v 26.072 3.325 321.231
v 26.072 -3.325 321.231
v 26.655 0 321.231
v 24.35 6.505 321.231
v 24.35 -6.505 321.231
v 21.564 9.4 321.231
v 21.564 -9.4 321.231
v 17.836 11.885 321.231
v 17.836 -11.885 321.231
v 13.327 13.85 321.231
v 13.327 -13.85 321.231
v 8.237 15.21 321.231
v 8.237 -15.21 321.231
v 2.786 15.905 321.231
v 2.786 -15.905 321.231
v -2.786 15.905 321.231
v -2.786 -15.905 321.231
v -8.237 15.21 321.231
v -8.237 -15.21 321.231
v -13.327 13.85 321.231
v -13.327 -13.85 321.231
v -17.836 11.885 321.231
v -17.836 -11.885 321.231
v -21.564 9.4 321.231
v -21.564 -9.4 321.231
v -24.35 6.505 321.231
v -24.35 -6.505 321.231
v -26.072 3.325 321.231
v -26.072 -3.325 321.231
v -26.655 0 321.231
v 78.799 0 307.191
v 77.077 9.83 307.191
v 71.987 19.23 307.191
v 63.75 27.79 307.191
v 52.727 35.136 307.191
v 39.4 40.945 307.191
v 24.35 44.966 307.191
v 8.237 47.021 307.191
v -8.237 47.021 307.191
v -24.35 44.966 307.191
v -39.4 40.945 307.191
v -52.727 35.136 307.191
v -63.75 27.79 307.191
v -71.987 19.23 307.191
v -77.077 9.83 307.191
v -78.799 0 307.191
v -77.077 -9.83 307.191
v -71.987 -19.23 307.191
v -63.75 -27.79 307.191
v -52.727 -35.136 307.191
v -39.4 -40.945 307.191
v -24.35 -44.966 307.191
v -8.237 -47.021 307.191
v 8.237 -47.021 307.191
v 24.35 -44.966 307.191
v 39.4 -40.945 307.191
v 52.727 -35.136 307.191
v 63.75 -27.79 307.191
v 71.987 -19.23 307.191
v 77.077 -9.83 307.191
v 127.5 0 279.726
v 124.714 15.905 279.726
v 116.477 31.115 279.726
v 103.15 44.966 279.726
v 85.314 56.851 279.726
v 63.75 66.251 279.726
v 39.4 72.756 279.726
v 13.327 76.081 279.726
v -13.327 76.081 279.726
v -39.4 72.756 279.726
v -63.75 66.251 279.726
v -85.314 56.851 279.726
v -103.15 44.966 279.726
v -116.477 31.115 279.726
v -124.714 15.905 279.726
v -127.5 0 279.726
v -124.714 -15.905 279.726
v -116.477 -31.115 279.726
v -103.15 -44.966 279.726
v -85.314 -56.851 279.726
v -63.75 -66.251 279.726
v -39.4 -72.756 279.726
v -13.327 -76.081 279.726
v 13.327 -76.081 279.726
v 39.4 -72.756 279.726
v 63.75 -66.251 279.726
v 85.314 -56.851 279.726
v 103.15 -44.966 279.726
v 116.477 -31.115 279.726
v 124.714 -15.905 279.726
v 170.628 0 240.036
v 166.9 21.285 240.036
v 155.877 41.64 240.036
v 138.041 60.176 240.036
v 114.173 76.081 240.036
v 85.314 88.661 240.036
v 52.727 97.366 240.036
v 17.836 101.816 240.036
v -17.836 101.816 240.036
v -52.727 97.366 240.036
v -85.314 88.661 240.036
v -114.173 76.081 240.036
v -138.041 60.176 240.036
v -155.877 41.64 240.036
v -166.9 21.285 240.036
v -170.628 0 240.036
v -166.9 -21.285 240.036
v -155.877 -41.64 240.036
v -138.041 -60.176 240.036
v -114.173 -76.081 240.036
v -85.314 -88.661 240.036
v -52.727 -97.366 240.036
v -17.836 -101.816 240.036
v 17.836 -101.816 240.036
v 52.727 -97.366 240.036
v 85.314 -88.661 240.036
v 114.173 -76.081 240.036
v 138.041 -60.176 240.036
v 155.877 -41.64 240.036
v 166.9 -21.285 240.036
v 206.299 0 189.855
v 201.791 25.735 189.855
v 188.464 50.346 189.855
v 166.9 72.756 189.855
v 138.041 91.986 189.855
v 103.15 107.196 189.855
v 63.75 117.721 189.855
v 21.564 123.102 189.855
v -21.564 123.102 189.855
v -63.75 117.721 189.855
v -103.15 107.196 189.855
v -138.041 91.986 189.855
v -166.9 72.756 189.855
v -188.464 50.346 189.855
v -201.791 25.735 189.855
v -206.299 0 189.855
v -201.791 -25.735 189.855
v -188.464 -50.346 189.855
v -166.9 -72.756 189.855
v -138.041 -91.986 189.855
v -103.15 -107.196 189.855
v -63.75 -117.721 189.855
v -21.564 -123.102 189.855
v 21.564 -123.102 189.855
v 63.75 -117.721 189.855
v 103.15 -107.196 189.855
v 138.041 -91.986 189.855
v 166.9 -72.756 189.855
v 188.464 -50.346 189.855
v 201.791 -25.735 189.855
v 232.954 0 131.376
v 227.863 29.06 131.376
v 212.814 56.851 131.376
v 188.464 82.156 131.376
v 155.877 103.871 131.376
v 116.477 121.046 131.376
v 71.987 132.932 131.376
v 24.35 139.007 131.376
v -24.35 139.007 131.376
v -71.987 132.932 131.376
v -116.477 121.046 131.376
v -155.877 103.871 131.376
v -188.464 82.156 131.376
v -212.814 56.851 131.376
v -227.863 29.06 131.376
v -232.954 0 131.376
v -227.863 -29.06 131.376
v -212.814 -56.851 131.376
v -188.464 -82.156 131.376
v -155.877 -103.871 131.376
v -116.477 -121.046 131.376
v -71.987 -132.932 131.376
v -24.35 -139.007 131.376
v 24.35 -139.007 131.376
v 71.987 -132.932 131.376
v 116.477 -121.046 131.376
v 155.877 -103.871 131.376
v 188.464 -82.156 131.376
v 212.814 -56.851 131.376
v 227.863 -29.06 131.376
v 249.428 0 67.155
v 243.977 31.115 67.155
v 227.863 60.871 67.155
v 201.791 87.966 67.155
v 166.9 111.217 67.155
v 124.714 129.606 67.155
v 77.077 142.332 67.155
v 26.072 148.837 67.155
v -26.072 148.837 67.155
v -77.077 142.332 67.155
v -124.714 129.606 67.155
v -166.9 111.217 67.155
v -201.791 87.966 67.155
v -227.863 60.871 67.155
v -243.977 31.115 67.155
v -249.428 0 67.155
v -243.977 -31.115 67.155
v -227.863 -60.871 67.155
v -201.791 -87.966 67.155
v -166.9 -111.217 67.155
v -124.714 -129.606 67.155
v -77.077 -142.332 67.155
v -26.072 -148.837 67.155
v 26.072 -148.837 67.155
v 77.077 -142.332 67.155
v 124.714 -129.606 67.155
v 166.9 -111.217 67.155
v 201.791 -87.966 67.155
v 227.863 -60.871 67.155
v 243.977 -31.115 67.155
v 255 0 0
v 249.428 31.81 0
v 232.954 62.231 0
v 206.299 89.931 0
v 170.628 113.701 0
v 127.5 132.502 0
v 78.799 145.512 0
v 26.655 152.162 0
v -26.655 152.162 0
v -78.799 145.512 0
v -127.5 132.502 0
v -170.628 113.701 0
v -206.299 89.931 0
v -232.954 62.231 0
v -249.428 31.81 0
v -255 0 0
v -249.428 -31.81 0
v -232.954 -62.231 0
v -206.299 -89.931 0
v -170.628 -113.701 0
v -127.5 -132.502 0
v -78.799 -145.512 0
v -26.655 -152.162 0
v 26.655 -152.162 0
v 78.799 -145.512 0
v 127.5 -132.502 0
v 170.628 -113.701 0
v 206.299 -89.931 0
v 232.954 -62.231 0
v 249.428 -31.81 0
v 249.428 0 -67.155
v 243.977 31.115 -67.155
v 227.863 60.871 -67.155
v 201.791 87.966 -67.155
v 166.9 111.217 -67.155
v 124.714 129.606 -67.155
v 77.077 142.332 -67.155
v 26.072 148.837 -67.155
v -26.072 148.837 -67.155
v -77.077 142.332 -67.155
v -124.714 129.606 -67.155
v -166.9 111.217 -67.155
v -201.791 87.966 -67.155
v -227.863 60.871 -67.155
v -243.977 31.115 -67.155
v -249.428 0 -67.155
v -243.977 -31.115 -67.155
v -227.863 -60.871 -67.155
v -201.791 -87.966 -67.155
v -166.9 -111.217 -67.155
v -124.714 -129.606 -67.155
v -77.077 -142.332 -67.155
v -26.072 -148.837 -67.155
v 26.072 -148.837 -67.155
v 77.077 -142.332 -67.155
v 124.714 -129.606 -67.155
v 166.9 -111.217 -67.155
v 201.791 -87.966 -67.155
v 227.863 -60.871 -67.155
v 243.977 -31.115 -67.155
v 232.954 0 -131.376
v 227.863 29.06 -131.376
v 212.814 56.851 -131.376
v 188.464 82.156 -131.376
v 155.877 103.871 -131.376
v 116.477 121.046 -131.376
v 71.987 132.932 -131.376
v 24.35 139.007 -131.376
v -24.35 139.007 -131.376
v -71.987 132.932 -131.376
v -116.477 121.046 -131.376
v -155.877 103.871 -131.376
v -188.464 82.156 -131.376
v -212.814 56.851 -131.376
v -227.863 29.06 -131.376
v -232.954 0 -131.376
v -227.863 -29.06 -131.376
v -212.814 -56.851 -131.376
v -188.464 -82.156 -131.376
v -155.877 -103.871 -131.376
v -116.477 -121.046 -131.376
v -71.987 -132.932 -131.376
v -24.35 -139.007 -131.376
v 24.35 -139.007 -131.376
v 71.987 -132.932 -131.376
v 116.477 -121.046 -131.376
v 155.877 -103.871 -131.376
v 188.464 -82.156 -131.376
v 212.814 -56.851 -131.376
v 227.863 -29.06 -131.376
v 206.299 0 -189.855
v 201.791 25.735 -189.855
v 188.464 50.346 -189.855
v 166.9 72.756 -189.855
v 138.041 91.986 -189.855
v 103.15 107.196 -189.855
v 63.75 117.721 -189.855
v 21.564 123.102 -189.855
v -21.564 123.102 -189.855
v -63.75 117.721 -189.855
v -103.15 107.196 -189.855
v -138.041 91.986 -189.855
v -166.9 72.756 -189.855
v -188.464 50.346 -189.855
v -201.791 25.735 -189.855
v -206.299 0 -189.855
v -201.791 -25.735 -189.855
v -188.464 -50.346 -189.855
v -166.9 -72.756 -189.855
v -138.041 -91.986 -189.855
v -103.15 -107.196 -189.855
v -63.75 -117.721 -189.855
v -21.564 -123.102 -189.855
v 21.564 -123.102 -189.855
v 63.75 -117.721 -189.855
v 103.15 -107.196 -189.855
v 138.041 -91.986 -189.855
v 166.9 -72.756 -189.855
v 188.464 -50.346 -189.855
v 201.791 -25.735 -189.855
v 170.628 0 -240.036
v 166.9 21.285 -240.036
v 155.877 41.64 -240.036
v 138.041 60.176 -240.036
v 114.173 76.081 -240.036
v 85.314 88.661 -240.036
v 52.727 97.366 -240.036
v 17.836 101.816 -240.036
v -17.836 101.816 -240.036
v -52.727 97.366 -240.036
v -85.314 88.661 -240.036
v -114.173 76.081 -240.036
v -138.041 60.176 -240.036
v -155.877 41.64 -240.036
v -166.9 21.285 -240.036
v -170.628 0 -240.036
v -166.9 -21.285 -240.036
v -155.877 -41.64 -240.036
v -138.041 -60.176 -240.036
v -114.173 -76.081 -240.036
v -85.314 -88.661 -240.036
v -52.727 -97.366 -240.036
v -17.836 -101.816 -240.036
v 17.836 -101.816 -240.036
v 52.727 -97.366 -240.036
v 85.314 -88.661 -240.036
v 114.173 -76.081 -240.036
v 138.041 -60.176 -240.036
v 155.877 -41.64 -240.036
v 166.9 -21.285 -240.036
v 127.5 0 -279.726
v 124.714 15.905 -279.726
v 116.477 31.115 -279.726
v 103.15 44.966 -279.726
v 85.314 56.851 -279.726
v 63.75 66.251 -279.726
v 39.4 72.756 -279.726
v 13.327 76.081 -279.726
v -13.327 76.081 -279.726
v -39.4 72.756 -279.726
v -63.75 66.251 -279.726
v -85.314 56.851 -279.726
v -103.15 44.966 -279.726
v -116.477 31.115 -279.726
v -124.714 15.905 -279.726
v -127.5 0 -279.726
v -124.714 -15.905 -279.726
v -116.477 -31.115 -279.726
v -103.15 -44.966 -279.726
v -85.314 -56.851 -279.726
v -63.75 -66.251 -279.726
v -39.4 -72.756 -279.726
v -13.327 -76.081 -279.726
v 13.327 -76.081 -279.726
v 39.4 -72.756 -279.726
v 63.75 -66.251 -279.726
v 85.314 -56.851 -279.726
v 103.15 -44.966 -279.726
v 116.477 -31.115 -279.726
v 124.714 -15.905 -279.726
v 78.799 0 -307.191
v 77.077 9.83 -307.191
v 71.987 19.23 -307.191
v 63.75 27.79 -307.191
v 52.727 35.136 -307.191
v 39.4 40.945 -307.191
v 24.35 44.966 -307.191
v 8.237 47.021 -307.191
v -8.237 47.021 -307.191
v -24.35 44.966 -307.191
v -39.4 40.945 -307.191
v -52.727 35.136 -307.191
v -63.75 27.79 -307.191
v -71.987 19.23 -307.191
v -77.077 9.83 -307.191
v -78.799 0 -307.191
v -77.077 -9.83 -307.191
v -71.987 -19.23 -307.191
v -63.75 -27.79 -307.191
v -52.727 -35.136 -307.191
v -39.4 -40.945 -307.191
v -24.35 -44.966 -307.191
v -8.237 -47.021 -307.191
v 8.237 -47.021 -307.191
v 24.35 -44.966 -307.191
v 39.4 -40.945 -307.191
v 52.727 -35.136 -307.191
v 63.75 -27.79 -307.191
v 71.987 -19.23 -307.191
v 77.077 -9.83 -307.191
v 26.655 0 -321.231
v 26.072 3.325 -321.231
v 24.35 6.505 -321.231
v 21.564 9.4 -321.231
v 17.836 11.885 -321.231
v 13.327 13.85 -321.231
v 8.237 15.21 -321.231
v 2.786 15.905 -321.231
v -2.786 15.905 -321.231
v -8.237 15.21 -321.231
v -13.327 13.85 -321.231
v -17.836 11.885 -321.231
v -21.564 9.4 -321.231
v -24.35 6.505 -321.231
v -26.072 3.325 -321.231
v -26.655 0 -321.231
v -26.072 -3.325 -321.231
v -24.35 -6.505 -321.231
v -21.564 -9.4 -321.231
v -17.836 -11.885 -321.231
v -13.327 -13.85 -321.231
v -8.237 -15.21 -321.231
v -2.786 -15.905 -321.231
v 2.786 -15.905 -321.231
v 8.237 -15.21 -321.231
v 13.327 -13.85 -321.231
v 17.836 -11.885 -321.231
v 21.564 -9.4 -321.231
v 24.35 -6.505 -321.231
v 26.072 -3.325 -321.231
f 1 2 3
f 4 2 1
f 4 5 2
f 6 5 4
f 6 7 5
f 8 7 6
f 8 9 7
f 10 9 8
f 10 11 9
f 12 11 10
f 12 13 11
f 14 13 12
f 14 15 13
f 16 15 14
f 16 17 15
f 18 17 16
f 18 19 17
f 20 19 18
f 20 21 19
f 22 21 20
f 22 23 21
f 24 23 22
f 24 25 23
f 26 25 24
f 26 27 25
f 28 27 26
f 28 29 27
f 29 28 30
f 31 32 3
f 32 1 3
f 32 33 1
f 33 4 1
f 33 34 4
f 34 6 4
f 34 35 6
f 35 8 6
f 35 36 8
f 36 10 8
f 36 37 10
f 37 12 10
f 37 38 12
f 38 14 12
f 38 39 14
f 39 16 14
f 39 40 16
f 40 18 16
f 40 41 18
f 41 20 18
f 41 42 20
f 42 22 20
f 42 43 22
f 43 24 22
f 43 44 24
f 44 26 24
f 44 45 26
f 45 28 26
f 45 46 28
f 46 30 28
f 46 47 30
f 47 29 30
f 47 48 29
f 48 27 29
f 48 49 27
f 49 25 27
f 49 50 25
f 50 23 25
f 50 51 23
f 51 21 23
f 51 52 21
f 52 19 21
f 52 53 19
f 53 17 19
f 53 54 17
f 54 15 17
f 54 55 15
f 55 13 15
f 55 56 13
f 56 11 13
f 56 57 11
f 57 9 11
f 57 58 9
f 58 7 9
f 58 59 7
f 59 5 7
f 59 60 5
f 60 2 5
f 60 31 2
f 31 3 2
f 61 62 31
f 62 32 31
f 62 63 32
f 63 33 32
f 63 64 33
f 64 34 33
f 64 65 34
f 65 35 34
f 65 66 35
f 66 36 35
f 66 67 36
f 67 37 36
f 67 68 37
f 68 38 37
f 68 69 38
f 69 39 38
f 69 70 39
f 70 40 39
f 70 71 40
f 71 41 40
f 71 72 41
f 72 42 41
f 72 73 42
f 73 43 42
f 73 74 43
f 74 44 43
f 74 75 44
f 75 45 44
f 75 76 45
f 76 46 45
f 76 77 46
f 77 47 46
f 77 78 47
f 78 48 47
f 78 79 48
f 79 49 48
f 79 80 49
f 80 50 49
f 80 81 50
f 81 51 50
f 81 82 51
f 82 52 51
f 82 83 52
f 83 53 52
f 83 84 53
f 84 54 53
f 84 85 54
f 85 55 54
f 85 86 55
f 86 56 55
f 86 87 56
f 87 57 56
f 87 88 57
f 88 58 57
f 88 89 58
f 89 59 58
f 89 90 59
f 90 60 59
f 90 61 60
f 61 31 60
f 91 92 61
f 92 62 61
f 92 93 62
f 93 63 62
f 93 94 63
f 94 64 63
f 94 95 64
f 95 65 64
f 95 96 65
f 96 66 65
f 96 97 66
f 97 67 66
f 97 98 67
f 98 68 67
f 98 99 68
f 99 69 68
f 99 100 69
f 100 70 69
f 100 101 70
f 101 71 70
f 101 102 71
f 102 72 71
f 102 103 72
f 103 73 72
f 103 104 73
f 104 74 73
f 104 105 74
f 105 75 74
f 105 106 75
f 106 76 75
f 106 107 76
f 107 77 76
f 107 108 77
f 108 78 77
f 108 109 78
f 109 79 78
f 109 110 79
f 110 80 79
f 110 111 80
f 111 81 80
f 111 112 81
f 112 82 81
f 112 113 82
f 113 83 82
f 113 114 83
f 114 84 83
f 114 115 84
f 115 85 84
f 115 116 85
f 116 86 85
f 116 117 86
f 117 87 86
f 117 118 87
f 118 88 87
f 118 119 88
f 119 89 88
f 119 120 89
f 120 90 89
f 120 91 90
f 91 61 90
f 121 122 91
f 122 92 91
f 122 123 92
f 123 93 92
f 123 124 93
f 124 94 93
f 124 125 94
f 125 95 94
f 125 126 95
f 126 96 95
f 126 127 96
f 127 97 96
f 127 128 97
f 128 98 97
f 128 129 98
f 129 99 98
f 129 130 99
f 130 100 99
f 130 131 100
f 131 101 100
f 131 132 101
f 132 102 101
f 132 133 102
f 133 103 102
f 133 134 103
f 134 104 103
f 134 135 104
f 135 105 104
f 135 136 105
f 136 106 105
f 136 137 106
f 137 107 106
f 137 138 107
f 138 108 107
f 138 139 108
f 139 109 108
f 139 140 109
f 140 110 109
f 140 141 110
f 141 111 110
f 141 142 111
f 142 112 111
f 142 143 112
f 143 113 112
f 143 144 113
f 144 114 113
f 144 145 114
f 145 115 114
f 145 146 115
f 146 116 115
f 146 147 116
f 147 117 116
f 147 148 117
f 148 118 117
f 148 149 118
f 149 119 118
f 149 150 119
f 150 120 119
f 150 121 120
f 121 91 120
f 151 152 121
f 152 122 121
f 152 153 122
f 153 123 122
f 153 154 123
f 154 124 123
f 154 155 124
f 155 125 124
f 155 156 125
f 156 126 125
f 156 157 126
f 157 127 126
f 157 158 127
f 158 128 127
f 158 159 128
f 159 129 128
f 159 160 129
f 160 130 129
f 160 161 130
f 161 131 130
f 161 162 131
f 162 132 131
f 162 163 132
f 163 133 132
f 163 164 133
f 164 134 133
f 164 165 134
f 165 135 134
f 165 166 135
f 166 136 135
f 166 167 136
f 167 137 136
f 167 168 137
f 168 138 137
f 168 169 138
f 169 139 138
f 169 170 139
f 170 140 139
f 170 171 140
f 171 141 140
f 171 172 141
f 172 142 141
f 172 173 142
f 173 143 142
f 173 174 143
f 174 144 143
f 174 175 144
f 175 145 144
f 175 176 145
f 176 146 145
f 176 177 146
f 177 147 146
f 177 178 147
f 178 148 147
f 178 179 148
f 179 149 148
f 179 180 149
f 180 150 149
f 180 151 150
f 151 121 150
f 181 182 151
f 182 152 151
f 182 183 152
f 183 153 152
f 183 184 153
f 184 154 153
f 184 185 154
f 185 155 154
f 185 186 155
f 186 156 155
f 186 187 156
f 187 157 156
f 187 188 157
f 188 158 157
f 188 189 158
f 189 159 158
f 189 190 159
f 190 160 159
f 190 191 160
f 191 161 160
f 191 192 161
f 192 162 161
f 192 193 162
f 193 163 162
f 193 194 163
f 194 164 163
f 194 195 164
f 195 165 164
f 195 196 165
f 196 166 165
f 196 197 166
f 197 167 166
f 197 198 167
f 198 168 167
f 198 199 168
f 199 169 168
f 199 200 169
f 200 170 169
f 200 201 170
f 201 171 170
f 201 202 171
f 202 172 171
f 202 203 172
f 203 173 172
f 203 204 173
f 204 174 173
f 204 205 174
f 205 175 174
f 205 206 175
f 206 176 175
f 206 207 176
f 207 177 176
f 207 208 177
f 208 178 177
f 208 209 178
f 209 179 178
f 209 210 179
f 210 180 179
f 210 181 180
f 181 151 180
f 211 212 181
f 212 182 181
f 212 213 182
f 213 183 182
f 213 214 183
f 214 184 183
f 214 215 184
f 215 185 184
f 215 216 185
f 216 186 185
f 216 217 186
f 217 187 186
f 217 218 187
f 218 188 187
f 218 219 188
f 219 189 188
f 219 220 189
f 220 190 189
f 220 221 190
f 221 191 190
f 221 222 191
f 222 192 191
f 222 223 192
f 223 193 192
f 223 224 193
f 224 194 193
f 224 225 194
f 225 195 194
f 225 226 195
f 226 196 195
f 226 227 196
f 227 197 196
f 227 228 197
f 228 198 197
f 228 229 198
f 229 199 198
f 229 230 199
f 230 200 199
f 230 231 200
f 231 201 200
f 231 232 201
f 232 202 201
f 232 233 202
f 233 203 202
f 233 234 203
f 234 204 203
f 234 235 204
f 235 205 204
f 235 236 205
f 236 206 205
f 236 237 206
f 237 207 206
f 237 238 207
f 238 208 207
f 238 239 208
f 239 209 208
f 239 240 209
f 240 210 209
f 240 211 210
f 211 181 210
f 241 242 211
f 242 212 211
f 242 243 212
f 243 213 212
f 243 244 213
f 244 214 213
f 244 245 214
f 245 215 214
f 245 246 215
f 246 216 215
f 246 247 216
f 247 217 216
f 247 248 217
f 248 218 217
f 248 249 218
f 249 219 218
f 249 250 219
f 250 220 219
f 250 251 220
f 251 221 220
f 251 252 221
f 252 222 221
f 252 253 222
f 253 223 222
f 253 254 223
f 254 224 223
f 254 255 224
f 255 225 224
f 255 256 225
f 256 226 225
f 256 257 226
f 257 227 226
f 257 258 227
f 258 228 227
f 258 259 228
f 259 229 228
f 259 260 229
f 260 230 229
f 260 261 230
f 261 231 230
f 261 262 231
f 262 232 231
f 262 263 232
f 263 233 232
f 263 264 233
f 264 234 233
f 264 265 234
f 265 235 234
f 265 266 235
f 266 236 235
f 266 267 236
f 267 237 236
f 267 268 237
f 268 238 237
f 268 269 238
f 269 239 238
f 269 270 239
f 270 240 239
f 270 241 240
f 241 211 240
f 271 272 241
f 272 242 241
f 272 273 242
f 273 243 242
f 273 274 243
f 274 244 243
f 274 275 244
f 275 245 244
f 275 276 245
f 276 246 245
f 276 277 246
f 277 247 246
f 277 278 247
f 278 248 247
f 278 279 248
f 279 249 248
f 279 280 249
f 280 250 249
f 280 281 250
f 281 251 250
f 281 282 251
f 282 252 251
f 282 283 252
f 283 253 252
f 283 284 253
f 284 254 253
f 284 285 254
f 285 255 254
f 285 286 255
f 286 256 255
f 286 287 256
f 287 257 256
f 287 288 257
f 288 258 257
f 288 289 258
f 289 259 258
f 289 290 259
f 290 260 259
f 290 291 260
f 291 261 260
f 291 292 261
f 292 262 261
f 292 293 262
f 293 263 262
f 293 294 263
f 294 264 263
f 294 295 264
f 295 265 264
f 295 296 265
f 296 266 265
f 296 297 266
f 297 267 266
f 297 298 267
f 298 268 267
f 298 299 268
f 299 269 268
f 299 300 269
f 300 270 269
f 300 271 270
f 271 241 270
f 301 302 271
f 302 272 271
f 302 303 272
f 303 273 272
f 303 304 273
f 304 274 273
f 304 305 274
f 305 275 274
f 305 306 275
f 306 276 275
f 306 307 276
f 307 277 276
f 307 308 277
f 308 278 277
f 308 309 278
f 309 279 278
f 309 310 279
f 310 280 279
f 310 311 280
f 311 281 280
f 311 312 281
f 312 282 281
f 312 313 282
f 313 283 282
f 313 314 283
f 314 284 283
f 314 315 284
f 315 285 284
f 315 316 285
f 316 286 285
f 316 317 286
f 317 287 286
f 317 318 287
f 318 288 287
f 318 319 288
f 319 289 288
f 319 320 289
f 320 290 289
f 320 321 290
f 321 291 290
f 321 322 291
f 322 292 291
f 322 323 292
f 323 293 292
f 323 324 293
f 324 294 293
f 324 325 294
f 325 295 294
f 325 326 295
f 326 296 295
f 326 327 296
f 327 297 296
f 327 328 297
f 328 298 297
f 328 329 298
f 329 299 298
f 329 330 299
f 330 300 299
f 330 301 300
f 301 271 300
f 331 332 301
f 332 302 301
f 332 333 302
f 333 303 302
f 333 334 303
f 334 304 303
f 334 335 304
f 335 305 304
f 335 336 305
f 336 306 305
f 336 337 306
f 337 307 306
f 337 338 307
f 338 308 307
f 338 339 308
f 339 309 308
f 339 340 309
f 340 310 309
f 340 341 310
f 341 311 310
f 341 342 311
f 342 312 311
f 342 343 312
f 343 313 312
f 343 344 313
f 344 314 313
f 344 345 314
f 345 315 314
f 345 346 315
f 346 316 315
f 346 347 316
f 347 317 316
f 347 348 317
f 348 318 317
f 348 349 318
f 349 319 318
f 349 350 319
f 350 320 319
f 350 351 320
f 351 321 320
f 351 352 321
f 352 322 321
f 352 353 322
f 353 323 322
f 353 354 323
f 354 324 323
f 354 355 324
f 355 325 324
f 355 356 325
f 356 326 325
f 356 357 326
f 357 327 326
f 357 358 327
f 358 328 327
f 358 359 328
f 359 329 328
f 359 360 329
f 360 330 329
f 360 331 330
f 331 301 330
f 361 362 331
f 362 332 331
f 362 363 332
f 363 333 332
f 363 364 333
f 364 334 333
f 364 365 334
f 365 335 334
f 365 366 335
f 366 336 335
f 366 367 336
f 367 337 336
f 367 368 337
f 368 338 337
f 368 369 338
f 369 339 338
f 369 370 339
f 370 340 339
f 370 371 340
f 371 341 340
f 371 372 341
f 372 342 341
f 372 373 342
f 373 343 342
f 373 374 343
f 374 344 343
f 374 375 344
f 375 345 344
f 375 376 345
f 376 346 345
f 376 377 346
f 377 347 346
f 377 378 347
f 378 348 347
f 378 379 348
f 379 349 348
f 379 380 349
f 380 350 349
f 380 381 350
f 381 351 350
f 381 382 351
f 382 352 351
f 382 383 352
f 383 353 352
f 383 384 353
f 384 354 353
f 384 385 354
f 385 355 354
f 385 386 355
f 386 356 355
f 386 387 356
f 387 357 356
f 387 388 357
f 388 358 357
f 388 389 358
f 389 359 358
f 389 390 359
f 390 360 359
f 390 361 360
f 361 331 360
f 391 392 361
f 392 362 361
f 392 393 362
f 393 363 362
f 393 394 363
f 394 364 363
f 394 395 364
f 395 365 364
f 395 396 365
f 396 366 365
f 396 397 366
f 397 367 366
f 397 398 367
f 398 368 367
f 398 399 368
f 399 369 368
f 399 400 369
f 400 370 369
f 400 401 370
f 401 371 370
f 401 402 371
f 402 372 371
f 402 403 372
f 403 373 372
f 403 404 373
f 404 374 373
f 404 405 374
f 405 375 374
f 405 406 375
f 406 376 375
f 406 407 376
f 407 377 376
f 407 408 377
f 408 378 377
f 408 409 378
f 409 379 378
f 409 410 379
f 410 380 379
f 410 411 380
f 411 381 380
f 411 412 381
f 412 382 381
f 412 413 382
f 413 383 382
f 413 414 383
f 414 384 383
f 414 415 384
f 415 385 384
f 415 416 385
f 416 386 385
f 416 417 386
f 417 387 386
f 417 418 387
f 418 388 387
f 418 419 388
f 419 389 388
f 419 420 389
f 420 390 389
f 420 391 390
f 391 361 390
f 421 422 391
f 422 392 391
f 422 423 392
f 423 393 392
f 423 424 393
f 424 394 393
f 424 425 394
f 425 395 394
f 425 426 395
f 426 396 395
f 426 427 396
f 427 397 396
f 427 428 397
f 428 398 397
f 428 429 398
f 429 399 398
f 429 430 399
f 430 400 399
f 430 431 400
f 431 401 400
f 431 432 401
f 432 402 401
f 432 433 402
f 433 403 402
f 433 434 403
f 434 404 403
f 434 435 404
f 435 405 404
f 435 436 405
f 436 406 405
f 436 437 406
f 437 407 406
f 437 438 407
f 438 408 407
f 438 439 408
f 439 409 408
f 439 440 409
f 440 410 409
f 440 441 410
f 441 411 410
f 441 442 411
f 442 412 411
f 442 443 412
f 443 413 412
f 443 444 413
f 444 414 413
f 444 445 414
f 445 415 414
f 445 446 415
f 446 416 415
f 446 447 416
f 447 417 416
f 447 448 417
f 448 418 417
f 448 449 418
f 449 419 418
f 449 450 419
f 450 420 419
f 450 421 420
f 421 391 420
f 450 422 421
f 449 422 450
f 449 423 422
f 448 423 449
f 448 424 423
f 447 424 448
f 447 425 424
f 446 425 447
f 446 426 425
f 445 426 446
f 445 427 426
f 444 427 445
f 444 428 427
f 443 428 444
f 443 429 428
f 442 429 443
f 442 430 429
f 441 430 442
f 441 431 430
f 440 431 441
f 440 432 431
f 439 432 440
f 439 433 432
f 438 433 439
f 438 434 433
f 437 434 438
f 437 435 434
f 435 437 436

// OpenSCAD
// Generated by SolidPython 1.0.1 on 2020-07-29 00:46:52


scale(v = [15, 9, 19]) {
	sphere(r = 17);
}
/***********************************************
*********      SolidPython code:      **********
************************************************
 
# import packages: SolidPython
from solid import *
from solid.utils import *
from itertools import chain, combinations, permutations


class Resize:

    def __init__(self, scad_file):
        self.scad_file = scad_file
        #self.scad_file = import_scad(scad_file)
        # cone/cylinder param:
        self.r1 = 0
        self.r2 = 0
        self.h = 0
        # rectangular prism param:
        self.w = 0
        self.l = 0
        # ellipse param:
        self.r = 0

    # import OpenScad code (file name corresponds to shape)


    # classify shape + parameters
    def assign(self, param1, param2, param3):
        if self.scad_file == 'cone.scad':
            self.r1 = param1
            self.r2 = param2
            self.h = param3
        elif self.scad_file == 'cylinder.scad':
            self.r1 = param1
            self.r2 = param2
            self.h = param3
        elif self.scad_file == 'rectangularPrism.scad':
            self.h = param1
            self.l = param2
            self.w = param3
        else:
            self.r = param1
            self.h = param2

    # resize parameters
    def iterate(self):
        x = range(3, 20, 2)
        i = 1
        if self.scad_file == 'cone.scad':
            tempList = list(permutations(x, 2))
            for temp in tempList:
                param1 = temp[0]
                param2 = temp[1]
                filepath = 'produced_scad_files/' + 'cone' + str(param1) + '_' + str(param2) + '_' + '.scad'
                scad_render_to_file(cylinder(h=param1, r1=param2, r2=0), filepath)

        elif self.scad_file == 'cylinder.scad':
            tempList = list(permutations(x, 3))
            for temp in tempList:
                param1 = temp[0]
                param2 = temp[1]
                filepath = 'produced_scad_files/' + 'cylinder' + str(param1) + '_' + str(param2) + '_' + '.scad'
                scad_render_to_file(cylinder(h=param1, r1=param2, r2=param2), filepath)

        elif self.scad_file == 'rectangularPrism.scad':
            tempList = list(permutations(x, 3))
            for temp in tempList:
                param1 = temp[0]
                param2 = temp[1]
                param3 = temp[2]
                filepath = 'produced_scad_files/' + 'rectangularPrism' + str(param1) + '_' + str(param2) + '_' + str(
                    param3) + '.scad'
                scad_render_to_file(cube(size=(param1, param2, param3)), filepath)

        elif self.scad_file == 'ellipse.scad':
            tempList = list(permutations(x, 4))
            for temp in tempList:
                param1 = temp[0]
                param2 = temp[1]
                param3 = temp[2]
                param4 = temp[3]
                filepath = 'produced_scad_files/' + 'ellipse' + str(param1) + '_' + str(param2) + '_' + str(param3) + '_' + str(param4) + '.scad'
                scad_render_to_file(scale([param1, param2, param3])(sphere(r=param4)), filepath)

    def render_to_scadfile(self):
        scad_render_to_file(scad, 'example.scad') 
 
************************************************/
